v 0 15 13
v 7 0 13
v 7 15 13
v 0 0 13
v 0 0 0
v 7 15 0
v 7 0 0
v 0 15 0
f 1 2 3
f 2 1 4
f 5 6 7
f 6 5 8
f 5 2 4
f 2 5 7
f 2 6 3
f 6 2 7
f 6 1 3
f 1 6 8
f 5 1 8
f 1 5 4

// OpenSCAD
// Generated by SolidPython 1.0.1 on 2020-07-29 00:46:55


cube(size = [7, 15, 13]);
/***********************************************
*********      SolidPython code:      **********
************************************************
 
# import packages: SolidPython
from solid import *
from solid.utils import *
from itertools import chain, combinations, permutations


class Resize:

    def __init__(self, scad_file):
        self.scad_file = scad_file
        #self.scad_file = import_scad(scad_file)
        # cone/cylinder param:
        self.r1 = 0
        self.r2 = 0
        self.h = 0
        # rectangular prism param:
        self.w = 0
        self.l = 0
        # ellipse param:
        self.r = 0

    # import OpenScad code (file name corresponds to shape)


    # classify shape + parameters
    def assign(self, param1, param2, param3):
        if self.scad_file == 'cone.scad':
            self.r1 = param1
            self.r2 = param2
            self.h = param3
        elif self.scad_file == 'cylinder.scad':
            self.r1 = param1
            self.r2 = param2
            self.h = param3
        elif self.scad_file == 'rectangularPrism.scad':
            self.h = param1
            self.l = param2
            self.w = param3
        else:
            self.r = param1
            self.h = param2

    # resize parameters
    def iterate(self):
        x = range(3, 20, 2)
        i = 1
        if self.scad_file == 'cone.scad':
            tempList = list(permutations(x, 2))
            for temp in tempList:
                param1 = temp[0]
                param2 = temp[1]
                filepath = 'produced_scad_files/' + 'cone' + str(param1) + '_' + str(param2) + '_' + '.scad'
                scad_render_to_file(cylinder(h=param1, r1=param2, r2=0), filepath)

        elif self.scad_file == 'cylinder.scad':
            tempList = list(permutations(x, 3))
            for temp in tempList:
                param1 = temp[0]
                param2 = temp[1]
                filepath = 'produced_scad_files/' + 'cylinder' + str(param1) + '_' + str(param2) + '_' + '.scad'
                scad_render_to_file(cylinder(h=param1, r1=param2, r2=param2), filepath)

        elif self.scad_file == 'rectangularPrism.scad':
            tempList = list(permutations(x, 3))
            for temp in tempList:
                param1 = temp[0]
                param2 = temp[1]
                param3 = temp[2]
                filepath = 'produced_scad_files/' + 'rectangularPrism' + str(param1) + '_' + str(param2) + '_' + str(
                    param3) + '.scad'
                scad_render_to_file(cube(size=(param1, param2, param3)), filepath)

        elif self.scad_file == 'ellipse.scad':
            tempList = list(permutations(x, 4))
            for temp in tempList:
                param1 = temp[0]
                param2 = temp[1]
                param3 = temp[2]
                param4 = temp[3]
                filepath = 'produced_scad_files/' + 'ellipse' + str(param1) + '_' + str(param2) + '_' + str(param3) + '_' + str(param4) + '.scad'
                scad_render_to_file(scale([param1, param2, param3])(sphere(r=param4)), filepath)

    def render_to_scadfile(self):
        scad_render_to_file(scad, 'example.scad') 
 
************************************************/
